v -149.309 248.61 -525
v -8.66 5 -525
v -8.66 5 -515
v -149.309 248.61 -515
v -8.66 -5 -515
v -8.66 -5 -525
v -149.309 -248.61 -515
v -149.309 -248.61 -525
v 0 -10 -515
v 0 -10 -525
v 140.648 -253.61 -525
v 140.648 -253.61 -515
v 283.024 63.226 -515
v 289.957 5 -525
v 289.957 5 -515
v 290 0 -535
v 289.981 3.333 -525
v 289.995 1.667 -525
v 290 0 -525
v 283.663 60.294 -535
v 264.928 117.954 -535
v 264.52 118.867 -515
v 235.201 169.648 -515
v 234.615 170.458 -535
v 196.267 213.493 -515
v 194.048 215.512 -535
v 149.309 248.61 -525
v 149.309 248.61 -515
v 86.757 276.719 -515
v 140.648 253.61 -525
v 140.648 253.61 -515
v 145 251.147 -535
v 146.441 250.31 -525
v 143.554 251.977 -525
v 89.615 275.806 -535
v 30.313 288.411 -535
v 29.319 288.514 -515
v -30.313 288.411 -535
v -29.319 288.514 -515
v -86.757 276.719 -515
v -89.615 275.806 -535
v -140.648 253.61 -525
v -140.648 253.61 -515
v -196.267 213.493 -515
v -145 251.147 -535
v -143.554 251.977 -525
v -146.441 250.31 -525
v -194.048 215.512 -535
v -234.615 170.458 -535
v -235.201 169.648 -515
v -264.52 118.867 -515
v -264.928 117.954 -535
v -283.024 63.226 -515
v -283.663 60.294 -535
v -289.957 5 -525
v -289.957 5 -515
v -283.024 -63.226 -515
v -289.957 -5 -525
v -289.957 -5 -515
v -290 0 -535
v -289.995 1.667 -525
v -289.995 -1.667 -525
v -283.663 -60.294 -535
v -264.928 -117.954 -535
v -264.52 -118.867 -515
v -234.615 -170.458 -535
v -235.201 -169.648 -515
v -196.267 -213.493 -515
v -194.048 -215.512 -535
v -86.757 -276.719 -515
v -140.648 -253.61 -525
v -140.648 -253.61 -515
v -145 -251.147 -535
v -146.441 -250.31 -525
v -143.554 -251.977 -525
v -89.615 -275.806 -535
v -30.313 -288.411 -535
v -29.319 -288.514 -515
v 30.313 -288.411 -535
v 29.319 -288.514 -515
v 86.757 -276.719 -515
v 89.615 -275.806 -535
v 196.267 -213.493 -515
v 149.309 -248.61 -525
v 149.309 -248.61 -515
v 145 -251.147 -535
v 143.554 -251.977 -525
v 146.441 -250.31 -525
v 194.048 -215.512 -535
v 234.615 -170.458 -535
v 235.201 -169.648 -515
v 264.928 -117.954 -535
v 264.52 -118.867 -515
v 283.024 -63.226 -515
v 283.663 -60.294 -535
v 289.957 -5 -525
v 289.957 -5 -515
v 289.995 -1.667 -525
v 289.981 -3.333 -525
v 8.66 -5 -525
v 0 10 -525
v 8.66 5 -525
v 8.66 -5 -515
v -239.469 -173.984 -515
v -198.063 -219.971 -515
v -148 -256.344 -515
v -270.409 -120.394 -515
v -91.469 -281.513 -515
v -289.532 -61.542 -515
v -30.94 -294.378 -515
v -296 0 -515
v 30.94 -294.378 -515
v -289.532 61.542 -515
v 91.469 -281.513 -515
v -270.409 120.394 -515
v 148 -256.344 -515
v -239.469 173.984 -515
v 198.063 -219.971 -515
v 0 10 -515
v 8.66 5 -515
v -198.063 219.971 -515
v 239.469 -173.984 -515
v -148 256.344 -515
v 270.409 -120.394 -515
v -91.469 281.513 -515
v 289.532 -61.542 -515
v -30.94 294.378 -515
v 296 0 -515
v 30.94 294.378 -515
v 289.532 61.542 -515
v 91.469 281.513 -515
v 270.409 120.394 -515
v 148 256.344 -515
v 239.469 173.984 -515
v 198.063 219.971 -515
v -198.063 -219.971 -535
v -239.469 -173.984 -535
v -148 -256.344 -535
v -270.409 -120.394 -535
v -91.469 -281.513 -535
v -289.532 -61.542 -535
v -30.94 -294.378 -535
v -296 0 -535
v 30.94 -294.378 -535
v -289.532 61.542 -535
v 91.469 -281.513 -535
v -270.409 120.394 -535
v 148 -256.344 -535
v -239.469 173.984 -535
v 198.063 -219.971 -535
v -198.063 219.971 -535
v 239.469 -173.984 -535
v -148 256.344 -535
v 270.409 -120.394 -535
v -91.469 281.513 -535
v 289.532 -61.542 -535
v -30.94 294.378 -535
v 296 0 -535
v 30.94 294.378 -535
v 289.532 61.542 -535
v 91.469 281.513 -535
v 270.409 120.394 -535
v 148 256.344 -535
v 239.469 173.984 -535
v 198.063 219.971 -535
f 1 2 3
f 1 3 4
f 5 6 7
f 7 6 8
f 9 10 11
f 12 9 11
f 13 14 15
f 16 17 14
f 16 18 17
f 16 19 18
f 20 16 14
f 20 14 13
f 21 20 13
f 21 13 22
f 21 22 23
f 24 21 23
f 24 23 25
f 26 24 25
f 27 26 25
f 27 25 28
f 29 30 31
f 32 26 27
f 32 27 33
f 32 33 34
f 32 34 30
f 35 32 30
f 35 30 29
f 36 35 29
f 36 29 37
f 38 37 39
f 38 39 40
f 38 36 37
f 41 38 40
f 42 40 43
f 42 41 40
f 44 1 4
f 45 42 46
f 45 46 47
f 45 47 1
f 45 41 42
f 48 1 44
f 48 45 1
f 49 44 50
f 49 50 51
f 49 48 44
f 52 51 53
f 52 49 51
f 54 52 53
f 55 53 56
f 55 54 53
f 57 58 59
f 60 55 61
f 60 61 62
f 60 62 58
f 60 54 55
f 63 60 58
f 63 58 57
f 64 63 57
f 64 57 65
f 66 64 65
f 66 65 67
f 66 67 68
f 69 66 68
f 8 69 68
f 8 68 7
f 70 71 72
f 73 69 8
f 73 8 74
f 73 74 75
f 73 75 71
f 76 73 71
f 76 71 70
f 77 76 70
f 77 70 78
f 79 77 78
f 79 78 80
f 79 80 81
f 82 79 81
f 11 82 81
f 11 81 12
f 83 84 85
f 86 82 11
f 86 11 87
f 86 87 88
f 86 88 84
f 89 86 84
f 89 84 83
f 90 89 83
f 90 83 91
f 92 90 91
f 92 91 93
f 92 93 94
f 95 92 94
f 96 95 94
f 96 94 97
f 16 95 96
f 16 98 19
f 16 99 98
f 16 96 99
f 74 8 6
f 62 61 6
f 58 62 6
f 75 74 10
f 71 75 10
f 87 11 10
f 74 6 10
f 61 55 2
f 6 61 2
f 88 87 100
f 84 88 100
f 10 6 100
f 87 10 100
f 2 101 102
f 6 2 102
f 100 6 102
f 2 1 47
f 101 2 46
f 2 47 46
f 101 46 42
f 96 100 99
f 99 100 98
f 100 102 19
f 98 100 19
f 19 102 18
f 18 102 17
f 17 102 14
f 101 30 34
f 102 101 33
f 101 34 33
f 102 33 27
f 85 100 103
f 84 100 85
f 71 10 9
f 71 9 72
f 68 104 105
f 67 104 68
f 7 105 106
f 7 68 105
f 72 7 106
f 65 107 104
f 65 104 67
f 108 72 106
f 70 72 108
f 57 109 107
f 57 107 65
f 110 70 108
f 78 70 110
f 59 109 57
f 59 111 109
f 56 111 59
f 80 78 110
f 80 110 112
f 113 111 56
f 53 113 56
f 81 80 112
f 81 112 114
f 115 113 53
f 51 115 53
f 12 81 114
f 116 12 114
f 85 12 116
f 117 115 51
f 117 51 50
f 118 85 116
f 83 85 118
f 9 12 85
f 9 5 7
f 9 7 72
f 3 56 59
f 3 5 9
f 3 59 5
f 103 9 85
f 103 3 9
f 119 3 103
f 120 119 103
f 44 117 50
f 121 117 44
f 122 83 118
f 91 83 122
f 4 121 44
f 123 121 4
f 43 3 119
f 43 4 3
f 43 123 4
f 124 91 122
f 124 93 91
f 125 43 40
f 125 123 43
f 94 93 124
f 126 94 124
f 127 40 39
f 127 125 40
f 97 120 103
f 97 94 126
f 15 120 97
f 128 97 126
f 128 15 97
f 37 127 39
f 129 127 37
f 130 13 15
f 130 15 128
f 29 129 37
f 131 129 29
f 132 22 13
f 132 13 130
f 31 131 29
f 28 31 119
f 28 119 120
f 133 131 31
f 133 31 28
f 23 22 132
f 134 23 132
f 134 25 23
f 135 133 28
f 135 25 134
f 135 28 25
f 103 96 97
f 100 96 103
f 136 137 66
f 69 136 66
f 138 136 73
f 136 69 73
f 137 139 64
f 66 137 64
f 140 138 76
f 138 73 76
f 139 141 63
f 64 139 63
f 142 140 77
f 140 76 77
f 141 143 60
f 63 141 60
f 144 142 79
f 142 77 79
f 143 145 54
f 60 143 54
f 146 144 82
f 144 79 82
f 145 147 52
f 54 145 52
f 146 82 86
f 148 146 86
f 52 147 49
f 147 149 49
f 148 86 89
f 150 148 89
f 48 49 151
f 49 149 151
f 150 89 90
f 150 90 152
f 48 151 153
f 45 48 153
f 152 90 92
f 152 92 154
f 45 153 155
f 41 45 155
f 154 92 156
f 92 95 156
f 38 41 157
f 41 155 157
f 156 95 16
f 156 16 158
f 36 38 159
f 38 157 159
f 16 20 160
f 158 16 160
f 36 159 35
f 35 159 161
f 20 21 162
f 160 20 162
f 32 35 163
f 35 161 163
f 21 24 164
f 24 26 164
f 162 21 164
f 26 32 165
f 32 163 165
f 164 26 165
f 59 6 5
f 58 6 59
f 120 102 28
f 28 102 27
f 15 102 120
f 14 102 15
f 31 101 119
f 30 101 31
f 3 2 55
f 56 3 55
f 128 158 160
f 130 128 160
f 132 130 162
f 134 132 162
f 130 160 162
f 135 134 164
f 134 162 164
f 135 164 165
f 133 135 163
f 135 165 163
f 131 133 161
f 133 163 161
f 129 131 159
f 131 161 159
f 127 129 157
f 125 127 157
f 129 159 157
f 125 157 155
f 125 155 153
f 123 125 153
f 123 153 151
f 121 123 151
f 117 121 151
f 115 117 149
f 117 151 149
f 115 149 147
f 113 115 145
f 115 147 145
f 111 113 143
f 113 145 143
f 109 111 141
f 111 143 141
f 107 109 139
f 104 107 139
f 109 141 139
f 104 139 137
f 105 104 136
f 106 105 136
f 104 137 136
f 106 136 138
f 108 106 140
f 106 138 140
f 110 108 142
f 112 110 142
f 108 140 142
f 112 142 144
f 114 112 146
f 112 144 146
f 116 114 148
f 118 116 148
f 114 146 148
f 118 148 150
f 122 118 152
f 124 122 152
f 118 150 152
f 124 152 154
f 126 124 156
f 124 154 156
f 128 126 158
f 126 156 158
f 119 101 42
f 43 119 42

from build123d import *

# Parameters (mm, degrees)
CYLINDER002_R     = 290
CYLINDER002_DEPTH = 20
CYLINDER001_R     = 296
CYLINDER001_DEPTH = 20
BOX_W             = 290
BOX_H             = 10
BOX_DEPTH         = 10
ARRAY003_COUNT    = 6


with BuildPart() as cilindro002:
    # Cylinder002 → Cylinder002 (new body)
    with BuildSketch(Plane.XY.offset(-535)):
        Circle(CYLINDER002_R)
    extrude(amount=CYLINDER002_DEPTH)


with BuildPart() as cut004:
    # Cylinder001 → Cylinder001 (new body)
    with BuildSketch(Plane.XY.offset(-535)):
        Circle(CYLINDER001_R)
    extrude(amount=CYLINDER001_DEPTH)

    # Cut003: cut Cilindro002
    add(cilindro002.part, mode=Mode.SUBTRACT)


with BuildPart() as fusion015:
    # Box → Box (new body)
    with BuildSketch(Plane(origin=(0, -5, -525), x_dir=(1, 0, 0), z_dir=(0, 0, 1))):
        with Locations((145, 5)):
            Rectangle(BOX_W, BOX_H)
    extrude(amount=BOX_DEPTH)

    # Array003: Fusion015 ×6 about axis
    array003_axis = Axis((0, 0, 0), (0, 0, 1))


with BuildPart() as fusion015_1:
    add(fusion015.part)
    for i in range(1, ARRAY003_COUNT):
        add(fusion015.part.rotate(array003_axis, i * 360 / ARRAY003_COUNT))

    # Fusion013: union Cut004
    add(cut004.part)


solid = fusion015_1.part
